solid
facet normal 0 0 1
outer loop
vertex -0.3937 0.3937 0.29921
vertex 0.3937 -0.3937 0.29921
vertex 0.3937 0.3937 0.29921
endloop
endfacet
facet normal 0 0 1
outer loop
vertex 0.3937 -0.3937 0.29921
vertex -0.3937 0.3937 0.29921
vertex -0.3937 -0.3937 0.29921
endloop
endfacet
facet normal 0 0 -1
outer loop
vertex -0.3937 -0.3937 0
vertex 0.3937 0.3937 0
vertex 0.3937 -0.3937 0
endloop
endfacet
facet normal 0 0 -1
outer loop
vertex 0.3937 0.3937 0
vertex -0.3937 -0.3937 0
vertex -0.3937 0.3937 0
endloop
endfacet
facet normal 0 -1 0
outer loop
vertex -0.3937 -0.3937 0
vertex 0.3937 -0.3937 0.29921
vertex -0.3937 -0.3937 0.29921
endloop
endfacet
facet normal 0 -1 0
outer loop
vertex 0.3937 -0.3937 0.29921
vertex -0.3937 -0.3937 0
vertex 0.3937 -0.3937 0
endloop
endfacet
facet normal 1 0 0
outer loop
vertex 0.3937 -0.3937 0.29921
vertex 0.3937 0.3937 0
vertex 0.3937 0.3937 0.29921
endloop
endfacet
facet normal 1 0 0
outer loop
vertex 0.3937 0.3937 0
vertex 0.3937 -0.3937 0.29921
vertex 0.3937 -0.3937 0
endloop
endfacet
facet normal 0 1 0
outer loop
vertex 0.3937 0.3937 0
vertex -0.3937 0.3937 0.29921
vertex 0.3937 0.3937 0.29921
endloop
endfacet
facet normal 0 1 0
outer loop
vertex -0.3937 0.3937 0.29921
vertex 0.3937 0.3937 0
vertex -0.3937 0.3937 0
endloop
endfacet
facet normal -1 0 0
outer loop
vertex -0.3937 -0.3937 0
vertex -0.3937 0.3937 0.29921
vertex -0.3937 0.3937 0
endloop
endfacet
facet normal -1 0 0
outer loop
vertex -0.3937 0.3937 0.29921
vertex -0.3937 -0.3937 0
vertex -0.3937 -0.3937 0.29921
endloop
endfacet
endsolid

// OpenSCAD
// file: defines.scad
L = 2.0;  // Длина
W = 2.0;  // Ширина
H = 0.8;  // Высота (от платы, с выводами)
Hf = 0.04;  // Возвышение над платой (высота выводов)
e = 0.5;    // Шаг выводов

pin_fragments = 16;

scale = 1/2.54;
// main file
include <defines.scad>

ox = 1.1/2;
oy = 1.2/2;

scale(scale)
  color([0.15,0.15,0.15])
    translate([0, 0, (H - Hf)/2]) {
        cube([L, W, H - Hf], center = true);
    }
